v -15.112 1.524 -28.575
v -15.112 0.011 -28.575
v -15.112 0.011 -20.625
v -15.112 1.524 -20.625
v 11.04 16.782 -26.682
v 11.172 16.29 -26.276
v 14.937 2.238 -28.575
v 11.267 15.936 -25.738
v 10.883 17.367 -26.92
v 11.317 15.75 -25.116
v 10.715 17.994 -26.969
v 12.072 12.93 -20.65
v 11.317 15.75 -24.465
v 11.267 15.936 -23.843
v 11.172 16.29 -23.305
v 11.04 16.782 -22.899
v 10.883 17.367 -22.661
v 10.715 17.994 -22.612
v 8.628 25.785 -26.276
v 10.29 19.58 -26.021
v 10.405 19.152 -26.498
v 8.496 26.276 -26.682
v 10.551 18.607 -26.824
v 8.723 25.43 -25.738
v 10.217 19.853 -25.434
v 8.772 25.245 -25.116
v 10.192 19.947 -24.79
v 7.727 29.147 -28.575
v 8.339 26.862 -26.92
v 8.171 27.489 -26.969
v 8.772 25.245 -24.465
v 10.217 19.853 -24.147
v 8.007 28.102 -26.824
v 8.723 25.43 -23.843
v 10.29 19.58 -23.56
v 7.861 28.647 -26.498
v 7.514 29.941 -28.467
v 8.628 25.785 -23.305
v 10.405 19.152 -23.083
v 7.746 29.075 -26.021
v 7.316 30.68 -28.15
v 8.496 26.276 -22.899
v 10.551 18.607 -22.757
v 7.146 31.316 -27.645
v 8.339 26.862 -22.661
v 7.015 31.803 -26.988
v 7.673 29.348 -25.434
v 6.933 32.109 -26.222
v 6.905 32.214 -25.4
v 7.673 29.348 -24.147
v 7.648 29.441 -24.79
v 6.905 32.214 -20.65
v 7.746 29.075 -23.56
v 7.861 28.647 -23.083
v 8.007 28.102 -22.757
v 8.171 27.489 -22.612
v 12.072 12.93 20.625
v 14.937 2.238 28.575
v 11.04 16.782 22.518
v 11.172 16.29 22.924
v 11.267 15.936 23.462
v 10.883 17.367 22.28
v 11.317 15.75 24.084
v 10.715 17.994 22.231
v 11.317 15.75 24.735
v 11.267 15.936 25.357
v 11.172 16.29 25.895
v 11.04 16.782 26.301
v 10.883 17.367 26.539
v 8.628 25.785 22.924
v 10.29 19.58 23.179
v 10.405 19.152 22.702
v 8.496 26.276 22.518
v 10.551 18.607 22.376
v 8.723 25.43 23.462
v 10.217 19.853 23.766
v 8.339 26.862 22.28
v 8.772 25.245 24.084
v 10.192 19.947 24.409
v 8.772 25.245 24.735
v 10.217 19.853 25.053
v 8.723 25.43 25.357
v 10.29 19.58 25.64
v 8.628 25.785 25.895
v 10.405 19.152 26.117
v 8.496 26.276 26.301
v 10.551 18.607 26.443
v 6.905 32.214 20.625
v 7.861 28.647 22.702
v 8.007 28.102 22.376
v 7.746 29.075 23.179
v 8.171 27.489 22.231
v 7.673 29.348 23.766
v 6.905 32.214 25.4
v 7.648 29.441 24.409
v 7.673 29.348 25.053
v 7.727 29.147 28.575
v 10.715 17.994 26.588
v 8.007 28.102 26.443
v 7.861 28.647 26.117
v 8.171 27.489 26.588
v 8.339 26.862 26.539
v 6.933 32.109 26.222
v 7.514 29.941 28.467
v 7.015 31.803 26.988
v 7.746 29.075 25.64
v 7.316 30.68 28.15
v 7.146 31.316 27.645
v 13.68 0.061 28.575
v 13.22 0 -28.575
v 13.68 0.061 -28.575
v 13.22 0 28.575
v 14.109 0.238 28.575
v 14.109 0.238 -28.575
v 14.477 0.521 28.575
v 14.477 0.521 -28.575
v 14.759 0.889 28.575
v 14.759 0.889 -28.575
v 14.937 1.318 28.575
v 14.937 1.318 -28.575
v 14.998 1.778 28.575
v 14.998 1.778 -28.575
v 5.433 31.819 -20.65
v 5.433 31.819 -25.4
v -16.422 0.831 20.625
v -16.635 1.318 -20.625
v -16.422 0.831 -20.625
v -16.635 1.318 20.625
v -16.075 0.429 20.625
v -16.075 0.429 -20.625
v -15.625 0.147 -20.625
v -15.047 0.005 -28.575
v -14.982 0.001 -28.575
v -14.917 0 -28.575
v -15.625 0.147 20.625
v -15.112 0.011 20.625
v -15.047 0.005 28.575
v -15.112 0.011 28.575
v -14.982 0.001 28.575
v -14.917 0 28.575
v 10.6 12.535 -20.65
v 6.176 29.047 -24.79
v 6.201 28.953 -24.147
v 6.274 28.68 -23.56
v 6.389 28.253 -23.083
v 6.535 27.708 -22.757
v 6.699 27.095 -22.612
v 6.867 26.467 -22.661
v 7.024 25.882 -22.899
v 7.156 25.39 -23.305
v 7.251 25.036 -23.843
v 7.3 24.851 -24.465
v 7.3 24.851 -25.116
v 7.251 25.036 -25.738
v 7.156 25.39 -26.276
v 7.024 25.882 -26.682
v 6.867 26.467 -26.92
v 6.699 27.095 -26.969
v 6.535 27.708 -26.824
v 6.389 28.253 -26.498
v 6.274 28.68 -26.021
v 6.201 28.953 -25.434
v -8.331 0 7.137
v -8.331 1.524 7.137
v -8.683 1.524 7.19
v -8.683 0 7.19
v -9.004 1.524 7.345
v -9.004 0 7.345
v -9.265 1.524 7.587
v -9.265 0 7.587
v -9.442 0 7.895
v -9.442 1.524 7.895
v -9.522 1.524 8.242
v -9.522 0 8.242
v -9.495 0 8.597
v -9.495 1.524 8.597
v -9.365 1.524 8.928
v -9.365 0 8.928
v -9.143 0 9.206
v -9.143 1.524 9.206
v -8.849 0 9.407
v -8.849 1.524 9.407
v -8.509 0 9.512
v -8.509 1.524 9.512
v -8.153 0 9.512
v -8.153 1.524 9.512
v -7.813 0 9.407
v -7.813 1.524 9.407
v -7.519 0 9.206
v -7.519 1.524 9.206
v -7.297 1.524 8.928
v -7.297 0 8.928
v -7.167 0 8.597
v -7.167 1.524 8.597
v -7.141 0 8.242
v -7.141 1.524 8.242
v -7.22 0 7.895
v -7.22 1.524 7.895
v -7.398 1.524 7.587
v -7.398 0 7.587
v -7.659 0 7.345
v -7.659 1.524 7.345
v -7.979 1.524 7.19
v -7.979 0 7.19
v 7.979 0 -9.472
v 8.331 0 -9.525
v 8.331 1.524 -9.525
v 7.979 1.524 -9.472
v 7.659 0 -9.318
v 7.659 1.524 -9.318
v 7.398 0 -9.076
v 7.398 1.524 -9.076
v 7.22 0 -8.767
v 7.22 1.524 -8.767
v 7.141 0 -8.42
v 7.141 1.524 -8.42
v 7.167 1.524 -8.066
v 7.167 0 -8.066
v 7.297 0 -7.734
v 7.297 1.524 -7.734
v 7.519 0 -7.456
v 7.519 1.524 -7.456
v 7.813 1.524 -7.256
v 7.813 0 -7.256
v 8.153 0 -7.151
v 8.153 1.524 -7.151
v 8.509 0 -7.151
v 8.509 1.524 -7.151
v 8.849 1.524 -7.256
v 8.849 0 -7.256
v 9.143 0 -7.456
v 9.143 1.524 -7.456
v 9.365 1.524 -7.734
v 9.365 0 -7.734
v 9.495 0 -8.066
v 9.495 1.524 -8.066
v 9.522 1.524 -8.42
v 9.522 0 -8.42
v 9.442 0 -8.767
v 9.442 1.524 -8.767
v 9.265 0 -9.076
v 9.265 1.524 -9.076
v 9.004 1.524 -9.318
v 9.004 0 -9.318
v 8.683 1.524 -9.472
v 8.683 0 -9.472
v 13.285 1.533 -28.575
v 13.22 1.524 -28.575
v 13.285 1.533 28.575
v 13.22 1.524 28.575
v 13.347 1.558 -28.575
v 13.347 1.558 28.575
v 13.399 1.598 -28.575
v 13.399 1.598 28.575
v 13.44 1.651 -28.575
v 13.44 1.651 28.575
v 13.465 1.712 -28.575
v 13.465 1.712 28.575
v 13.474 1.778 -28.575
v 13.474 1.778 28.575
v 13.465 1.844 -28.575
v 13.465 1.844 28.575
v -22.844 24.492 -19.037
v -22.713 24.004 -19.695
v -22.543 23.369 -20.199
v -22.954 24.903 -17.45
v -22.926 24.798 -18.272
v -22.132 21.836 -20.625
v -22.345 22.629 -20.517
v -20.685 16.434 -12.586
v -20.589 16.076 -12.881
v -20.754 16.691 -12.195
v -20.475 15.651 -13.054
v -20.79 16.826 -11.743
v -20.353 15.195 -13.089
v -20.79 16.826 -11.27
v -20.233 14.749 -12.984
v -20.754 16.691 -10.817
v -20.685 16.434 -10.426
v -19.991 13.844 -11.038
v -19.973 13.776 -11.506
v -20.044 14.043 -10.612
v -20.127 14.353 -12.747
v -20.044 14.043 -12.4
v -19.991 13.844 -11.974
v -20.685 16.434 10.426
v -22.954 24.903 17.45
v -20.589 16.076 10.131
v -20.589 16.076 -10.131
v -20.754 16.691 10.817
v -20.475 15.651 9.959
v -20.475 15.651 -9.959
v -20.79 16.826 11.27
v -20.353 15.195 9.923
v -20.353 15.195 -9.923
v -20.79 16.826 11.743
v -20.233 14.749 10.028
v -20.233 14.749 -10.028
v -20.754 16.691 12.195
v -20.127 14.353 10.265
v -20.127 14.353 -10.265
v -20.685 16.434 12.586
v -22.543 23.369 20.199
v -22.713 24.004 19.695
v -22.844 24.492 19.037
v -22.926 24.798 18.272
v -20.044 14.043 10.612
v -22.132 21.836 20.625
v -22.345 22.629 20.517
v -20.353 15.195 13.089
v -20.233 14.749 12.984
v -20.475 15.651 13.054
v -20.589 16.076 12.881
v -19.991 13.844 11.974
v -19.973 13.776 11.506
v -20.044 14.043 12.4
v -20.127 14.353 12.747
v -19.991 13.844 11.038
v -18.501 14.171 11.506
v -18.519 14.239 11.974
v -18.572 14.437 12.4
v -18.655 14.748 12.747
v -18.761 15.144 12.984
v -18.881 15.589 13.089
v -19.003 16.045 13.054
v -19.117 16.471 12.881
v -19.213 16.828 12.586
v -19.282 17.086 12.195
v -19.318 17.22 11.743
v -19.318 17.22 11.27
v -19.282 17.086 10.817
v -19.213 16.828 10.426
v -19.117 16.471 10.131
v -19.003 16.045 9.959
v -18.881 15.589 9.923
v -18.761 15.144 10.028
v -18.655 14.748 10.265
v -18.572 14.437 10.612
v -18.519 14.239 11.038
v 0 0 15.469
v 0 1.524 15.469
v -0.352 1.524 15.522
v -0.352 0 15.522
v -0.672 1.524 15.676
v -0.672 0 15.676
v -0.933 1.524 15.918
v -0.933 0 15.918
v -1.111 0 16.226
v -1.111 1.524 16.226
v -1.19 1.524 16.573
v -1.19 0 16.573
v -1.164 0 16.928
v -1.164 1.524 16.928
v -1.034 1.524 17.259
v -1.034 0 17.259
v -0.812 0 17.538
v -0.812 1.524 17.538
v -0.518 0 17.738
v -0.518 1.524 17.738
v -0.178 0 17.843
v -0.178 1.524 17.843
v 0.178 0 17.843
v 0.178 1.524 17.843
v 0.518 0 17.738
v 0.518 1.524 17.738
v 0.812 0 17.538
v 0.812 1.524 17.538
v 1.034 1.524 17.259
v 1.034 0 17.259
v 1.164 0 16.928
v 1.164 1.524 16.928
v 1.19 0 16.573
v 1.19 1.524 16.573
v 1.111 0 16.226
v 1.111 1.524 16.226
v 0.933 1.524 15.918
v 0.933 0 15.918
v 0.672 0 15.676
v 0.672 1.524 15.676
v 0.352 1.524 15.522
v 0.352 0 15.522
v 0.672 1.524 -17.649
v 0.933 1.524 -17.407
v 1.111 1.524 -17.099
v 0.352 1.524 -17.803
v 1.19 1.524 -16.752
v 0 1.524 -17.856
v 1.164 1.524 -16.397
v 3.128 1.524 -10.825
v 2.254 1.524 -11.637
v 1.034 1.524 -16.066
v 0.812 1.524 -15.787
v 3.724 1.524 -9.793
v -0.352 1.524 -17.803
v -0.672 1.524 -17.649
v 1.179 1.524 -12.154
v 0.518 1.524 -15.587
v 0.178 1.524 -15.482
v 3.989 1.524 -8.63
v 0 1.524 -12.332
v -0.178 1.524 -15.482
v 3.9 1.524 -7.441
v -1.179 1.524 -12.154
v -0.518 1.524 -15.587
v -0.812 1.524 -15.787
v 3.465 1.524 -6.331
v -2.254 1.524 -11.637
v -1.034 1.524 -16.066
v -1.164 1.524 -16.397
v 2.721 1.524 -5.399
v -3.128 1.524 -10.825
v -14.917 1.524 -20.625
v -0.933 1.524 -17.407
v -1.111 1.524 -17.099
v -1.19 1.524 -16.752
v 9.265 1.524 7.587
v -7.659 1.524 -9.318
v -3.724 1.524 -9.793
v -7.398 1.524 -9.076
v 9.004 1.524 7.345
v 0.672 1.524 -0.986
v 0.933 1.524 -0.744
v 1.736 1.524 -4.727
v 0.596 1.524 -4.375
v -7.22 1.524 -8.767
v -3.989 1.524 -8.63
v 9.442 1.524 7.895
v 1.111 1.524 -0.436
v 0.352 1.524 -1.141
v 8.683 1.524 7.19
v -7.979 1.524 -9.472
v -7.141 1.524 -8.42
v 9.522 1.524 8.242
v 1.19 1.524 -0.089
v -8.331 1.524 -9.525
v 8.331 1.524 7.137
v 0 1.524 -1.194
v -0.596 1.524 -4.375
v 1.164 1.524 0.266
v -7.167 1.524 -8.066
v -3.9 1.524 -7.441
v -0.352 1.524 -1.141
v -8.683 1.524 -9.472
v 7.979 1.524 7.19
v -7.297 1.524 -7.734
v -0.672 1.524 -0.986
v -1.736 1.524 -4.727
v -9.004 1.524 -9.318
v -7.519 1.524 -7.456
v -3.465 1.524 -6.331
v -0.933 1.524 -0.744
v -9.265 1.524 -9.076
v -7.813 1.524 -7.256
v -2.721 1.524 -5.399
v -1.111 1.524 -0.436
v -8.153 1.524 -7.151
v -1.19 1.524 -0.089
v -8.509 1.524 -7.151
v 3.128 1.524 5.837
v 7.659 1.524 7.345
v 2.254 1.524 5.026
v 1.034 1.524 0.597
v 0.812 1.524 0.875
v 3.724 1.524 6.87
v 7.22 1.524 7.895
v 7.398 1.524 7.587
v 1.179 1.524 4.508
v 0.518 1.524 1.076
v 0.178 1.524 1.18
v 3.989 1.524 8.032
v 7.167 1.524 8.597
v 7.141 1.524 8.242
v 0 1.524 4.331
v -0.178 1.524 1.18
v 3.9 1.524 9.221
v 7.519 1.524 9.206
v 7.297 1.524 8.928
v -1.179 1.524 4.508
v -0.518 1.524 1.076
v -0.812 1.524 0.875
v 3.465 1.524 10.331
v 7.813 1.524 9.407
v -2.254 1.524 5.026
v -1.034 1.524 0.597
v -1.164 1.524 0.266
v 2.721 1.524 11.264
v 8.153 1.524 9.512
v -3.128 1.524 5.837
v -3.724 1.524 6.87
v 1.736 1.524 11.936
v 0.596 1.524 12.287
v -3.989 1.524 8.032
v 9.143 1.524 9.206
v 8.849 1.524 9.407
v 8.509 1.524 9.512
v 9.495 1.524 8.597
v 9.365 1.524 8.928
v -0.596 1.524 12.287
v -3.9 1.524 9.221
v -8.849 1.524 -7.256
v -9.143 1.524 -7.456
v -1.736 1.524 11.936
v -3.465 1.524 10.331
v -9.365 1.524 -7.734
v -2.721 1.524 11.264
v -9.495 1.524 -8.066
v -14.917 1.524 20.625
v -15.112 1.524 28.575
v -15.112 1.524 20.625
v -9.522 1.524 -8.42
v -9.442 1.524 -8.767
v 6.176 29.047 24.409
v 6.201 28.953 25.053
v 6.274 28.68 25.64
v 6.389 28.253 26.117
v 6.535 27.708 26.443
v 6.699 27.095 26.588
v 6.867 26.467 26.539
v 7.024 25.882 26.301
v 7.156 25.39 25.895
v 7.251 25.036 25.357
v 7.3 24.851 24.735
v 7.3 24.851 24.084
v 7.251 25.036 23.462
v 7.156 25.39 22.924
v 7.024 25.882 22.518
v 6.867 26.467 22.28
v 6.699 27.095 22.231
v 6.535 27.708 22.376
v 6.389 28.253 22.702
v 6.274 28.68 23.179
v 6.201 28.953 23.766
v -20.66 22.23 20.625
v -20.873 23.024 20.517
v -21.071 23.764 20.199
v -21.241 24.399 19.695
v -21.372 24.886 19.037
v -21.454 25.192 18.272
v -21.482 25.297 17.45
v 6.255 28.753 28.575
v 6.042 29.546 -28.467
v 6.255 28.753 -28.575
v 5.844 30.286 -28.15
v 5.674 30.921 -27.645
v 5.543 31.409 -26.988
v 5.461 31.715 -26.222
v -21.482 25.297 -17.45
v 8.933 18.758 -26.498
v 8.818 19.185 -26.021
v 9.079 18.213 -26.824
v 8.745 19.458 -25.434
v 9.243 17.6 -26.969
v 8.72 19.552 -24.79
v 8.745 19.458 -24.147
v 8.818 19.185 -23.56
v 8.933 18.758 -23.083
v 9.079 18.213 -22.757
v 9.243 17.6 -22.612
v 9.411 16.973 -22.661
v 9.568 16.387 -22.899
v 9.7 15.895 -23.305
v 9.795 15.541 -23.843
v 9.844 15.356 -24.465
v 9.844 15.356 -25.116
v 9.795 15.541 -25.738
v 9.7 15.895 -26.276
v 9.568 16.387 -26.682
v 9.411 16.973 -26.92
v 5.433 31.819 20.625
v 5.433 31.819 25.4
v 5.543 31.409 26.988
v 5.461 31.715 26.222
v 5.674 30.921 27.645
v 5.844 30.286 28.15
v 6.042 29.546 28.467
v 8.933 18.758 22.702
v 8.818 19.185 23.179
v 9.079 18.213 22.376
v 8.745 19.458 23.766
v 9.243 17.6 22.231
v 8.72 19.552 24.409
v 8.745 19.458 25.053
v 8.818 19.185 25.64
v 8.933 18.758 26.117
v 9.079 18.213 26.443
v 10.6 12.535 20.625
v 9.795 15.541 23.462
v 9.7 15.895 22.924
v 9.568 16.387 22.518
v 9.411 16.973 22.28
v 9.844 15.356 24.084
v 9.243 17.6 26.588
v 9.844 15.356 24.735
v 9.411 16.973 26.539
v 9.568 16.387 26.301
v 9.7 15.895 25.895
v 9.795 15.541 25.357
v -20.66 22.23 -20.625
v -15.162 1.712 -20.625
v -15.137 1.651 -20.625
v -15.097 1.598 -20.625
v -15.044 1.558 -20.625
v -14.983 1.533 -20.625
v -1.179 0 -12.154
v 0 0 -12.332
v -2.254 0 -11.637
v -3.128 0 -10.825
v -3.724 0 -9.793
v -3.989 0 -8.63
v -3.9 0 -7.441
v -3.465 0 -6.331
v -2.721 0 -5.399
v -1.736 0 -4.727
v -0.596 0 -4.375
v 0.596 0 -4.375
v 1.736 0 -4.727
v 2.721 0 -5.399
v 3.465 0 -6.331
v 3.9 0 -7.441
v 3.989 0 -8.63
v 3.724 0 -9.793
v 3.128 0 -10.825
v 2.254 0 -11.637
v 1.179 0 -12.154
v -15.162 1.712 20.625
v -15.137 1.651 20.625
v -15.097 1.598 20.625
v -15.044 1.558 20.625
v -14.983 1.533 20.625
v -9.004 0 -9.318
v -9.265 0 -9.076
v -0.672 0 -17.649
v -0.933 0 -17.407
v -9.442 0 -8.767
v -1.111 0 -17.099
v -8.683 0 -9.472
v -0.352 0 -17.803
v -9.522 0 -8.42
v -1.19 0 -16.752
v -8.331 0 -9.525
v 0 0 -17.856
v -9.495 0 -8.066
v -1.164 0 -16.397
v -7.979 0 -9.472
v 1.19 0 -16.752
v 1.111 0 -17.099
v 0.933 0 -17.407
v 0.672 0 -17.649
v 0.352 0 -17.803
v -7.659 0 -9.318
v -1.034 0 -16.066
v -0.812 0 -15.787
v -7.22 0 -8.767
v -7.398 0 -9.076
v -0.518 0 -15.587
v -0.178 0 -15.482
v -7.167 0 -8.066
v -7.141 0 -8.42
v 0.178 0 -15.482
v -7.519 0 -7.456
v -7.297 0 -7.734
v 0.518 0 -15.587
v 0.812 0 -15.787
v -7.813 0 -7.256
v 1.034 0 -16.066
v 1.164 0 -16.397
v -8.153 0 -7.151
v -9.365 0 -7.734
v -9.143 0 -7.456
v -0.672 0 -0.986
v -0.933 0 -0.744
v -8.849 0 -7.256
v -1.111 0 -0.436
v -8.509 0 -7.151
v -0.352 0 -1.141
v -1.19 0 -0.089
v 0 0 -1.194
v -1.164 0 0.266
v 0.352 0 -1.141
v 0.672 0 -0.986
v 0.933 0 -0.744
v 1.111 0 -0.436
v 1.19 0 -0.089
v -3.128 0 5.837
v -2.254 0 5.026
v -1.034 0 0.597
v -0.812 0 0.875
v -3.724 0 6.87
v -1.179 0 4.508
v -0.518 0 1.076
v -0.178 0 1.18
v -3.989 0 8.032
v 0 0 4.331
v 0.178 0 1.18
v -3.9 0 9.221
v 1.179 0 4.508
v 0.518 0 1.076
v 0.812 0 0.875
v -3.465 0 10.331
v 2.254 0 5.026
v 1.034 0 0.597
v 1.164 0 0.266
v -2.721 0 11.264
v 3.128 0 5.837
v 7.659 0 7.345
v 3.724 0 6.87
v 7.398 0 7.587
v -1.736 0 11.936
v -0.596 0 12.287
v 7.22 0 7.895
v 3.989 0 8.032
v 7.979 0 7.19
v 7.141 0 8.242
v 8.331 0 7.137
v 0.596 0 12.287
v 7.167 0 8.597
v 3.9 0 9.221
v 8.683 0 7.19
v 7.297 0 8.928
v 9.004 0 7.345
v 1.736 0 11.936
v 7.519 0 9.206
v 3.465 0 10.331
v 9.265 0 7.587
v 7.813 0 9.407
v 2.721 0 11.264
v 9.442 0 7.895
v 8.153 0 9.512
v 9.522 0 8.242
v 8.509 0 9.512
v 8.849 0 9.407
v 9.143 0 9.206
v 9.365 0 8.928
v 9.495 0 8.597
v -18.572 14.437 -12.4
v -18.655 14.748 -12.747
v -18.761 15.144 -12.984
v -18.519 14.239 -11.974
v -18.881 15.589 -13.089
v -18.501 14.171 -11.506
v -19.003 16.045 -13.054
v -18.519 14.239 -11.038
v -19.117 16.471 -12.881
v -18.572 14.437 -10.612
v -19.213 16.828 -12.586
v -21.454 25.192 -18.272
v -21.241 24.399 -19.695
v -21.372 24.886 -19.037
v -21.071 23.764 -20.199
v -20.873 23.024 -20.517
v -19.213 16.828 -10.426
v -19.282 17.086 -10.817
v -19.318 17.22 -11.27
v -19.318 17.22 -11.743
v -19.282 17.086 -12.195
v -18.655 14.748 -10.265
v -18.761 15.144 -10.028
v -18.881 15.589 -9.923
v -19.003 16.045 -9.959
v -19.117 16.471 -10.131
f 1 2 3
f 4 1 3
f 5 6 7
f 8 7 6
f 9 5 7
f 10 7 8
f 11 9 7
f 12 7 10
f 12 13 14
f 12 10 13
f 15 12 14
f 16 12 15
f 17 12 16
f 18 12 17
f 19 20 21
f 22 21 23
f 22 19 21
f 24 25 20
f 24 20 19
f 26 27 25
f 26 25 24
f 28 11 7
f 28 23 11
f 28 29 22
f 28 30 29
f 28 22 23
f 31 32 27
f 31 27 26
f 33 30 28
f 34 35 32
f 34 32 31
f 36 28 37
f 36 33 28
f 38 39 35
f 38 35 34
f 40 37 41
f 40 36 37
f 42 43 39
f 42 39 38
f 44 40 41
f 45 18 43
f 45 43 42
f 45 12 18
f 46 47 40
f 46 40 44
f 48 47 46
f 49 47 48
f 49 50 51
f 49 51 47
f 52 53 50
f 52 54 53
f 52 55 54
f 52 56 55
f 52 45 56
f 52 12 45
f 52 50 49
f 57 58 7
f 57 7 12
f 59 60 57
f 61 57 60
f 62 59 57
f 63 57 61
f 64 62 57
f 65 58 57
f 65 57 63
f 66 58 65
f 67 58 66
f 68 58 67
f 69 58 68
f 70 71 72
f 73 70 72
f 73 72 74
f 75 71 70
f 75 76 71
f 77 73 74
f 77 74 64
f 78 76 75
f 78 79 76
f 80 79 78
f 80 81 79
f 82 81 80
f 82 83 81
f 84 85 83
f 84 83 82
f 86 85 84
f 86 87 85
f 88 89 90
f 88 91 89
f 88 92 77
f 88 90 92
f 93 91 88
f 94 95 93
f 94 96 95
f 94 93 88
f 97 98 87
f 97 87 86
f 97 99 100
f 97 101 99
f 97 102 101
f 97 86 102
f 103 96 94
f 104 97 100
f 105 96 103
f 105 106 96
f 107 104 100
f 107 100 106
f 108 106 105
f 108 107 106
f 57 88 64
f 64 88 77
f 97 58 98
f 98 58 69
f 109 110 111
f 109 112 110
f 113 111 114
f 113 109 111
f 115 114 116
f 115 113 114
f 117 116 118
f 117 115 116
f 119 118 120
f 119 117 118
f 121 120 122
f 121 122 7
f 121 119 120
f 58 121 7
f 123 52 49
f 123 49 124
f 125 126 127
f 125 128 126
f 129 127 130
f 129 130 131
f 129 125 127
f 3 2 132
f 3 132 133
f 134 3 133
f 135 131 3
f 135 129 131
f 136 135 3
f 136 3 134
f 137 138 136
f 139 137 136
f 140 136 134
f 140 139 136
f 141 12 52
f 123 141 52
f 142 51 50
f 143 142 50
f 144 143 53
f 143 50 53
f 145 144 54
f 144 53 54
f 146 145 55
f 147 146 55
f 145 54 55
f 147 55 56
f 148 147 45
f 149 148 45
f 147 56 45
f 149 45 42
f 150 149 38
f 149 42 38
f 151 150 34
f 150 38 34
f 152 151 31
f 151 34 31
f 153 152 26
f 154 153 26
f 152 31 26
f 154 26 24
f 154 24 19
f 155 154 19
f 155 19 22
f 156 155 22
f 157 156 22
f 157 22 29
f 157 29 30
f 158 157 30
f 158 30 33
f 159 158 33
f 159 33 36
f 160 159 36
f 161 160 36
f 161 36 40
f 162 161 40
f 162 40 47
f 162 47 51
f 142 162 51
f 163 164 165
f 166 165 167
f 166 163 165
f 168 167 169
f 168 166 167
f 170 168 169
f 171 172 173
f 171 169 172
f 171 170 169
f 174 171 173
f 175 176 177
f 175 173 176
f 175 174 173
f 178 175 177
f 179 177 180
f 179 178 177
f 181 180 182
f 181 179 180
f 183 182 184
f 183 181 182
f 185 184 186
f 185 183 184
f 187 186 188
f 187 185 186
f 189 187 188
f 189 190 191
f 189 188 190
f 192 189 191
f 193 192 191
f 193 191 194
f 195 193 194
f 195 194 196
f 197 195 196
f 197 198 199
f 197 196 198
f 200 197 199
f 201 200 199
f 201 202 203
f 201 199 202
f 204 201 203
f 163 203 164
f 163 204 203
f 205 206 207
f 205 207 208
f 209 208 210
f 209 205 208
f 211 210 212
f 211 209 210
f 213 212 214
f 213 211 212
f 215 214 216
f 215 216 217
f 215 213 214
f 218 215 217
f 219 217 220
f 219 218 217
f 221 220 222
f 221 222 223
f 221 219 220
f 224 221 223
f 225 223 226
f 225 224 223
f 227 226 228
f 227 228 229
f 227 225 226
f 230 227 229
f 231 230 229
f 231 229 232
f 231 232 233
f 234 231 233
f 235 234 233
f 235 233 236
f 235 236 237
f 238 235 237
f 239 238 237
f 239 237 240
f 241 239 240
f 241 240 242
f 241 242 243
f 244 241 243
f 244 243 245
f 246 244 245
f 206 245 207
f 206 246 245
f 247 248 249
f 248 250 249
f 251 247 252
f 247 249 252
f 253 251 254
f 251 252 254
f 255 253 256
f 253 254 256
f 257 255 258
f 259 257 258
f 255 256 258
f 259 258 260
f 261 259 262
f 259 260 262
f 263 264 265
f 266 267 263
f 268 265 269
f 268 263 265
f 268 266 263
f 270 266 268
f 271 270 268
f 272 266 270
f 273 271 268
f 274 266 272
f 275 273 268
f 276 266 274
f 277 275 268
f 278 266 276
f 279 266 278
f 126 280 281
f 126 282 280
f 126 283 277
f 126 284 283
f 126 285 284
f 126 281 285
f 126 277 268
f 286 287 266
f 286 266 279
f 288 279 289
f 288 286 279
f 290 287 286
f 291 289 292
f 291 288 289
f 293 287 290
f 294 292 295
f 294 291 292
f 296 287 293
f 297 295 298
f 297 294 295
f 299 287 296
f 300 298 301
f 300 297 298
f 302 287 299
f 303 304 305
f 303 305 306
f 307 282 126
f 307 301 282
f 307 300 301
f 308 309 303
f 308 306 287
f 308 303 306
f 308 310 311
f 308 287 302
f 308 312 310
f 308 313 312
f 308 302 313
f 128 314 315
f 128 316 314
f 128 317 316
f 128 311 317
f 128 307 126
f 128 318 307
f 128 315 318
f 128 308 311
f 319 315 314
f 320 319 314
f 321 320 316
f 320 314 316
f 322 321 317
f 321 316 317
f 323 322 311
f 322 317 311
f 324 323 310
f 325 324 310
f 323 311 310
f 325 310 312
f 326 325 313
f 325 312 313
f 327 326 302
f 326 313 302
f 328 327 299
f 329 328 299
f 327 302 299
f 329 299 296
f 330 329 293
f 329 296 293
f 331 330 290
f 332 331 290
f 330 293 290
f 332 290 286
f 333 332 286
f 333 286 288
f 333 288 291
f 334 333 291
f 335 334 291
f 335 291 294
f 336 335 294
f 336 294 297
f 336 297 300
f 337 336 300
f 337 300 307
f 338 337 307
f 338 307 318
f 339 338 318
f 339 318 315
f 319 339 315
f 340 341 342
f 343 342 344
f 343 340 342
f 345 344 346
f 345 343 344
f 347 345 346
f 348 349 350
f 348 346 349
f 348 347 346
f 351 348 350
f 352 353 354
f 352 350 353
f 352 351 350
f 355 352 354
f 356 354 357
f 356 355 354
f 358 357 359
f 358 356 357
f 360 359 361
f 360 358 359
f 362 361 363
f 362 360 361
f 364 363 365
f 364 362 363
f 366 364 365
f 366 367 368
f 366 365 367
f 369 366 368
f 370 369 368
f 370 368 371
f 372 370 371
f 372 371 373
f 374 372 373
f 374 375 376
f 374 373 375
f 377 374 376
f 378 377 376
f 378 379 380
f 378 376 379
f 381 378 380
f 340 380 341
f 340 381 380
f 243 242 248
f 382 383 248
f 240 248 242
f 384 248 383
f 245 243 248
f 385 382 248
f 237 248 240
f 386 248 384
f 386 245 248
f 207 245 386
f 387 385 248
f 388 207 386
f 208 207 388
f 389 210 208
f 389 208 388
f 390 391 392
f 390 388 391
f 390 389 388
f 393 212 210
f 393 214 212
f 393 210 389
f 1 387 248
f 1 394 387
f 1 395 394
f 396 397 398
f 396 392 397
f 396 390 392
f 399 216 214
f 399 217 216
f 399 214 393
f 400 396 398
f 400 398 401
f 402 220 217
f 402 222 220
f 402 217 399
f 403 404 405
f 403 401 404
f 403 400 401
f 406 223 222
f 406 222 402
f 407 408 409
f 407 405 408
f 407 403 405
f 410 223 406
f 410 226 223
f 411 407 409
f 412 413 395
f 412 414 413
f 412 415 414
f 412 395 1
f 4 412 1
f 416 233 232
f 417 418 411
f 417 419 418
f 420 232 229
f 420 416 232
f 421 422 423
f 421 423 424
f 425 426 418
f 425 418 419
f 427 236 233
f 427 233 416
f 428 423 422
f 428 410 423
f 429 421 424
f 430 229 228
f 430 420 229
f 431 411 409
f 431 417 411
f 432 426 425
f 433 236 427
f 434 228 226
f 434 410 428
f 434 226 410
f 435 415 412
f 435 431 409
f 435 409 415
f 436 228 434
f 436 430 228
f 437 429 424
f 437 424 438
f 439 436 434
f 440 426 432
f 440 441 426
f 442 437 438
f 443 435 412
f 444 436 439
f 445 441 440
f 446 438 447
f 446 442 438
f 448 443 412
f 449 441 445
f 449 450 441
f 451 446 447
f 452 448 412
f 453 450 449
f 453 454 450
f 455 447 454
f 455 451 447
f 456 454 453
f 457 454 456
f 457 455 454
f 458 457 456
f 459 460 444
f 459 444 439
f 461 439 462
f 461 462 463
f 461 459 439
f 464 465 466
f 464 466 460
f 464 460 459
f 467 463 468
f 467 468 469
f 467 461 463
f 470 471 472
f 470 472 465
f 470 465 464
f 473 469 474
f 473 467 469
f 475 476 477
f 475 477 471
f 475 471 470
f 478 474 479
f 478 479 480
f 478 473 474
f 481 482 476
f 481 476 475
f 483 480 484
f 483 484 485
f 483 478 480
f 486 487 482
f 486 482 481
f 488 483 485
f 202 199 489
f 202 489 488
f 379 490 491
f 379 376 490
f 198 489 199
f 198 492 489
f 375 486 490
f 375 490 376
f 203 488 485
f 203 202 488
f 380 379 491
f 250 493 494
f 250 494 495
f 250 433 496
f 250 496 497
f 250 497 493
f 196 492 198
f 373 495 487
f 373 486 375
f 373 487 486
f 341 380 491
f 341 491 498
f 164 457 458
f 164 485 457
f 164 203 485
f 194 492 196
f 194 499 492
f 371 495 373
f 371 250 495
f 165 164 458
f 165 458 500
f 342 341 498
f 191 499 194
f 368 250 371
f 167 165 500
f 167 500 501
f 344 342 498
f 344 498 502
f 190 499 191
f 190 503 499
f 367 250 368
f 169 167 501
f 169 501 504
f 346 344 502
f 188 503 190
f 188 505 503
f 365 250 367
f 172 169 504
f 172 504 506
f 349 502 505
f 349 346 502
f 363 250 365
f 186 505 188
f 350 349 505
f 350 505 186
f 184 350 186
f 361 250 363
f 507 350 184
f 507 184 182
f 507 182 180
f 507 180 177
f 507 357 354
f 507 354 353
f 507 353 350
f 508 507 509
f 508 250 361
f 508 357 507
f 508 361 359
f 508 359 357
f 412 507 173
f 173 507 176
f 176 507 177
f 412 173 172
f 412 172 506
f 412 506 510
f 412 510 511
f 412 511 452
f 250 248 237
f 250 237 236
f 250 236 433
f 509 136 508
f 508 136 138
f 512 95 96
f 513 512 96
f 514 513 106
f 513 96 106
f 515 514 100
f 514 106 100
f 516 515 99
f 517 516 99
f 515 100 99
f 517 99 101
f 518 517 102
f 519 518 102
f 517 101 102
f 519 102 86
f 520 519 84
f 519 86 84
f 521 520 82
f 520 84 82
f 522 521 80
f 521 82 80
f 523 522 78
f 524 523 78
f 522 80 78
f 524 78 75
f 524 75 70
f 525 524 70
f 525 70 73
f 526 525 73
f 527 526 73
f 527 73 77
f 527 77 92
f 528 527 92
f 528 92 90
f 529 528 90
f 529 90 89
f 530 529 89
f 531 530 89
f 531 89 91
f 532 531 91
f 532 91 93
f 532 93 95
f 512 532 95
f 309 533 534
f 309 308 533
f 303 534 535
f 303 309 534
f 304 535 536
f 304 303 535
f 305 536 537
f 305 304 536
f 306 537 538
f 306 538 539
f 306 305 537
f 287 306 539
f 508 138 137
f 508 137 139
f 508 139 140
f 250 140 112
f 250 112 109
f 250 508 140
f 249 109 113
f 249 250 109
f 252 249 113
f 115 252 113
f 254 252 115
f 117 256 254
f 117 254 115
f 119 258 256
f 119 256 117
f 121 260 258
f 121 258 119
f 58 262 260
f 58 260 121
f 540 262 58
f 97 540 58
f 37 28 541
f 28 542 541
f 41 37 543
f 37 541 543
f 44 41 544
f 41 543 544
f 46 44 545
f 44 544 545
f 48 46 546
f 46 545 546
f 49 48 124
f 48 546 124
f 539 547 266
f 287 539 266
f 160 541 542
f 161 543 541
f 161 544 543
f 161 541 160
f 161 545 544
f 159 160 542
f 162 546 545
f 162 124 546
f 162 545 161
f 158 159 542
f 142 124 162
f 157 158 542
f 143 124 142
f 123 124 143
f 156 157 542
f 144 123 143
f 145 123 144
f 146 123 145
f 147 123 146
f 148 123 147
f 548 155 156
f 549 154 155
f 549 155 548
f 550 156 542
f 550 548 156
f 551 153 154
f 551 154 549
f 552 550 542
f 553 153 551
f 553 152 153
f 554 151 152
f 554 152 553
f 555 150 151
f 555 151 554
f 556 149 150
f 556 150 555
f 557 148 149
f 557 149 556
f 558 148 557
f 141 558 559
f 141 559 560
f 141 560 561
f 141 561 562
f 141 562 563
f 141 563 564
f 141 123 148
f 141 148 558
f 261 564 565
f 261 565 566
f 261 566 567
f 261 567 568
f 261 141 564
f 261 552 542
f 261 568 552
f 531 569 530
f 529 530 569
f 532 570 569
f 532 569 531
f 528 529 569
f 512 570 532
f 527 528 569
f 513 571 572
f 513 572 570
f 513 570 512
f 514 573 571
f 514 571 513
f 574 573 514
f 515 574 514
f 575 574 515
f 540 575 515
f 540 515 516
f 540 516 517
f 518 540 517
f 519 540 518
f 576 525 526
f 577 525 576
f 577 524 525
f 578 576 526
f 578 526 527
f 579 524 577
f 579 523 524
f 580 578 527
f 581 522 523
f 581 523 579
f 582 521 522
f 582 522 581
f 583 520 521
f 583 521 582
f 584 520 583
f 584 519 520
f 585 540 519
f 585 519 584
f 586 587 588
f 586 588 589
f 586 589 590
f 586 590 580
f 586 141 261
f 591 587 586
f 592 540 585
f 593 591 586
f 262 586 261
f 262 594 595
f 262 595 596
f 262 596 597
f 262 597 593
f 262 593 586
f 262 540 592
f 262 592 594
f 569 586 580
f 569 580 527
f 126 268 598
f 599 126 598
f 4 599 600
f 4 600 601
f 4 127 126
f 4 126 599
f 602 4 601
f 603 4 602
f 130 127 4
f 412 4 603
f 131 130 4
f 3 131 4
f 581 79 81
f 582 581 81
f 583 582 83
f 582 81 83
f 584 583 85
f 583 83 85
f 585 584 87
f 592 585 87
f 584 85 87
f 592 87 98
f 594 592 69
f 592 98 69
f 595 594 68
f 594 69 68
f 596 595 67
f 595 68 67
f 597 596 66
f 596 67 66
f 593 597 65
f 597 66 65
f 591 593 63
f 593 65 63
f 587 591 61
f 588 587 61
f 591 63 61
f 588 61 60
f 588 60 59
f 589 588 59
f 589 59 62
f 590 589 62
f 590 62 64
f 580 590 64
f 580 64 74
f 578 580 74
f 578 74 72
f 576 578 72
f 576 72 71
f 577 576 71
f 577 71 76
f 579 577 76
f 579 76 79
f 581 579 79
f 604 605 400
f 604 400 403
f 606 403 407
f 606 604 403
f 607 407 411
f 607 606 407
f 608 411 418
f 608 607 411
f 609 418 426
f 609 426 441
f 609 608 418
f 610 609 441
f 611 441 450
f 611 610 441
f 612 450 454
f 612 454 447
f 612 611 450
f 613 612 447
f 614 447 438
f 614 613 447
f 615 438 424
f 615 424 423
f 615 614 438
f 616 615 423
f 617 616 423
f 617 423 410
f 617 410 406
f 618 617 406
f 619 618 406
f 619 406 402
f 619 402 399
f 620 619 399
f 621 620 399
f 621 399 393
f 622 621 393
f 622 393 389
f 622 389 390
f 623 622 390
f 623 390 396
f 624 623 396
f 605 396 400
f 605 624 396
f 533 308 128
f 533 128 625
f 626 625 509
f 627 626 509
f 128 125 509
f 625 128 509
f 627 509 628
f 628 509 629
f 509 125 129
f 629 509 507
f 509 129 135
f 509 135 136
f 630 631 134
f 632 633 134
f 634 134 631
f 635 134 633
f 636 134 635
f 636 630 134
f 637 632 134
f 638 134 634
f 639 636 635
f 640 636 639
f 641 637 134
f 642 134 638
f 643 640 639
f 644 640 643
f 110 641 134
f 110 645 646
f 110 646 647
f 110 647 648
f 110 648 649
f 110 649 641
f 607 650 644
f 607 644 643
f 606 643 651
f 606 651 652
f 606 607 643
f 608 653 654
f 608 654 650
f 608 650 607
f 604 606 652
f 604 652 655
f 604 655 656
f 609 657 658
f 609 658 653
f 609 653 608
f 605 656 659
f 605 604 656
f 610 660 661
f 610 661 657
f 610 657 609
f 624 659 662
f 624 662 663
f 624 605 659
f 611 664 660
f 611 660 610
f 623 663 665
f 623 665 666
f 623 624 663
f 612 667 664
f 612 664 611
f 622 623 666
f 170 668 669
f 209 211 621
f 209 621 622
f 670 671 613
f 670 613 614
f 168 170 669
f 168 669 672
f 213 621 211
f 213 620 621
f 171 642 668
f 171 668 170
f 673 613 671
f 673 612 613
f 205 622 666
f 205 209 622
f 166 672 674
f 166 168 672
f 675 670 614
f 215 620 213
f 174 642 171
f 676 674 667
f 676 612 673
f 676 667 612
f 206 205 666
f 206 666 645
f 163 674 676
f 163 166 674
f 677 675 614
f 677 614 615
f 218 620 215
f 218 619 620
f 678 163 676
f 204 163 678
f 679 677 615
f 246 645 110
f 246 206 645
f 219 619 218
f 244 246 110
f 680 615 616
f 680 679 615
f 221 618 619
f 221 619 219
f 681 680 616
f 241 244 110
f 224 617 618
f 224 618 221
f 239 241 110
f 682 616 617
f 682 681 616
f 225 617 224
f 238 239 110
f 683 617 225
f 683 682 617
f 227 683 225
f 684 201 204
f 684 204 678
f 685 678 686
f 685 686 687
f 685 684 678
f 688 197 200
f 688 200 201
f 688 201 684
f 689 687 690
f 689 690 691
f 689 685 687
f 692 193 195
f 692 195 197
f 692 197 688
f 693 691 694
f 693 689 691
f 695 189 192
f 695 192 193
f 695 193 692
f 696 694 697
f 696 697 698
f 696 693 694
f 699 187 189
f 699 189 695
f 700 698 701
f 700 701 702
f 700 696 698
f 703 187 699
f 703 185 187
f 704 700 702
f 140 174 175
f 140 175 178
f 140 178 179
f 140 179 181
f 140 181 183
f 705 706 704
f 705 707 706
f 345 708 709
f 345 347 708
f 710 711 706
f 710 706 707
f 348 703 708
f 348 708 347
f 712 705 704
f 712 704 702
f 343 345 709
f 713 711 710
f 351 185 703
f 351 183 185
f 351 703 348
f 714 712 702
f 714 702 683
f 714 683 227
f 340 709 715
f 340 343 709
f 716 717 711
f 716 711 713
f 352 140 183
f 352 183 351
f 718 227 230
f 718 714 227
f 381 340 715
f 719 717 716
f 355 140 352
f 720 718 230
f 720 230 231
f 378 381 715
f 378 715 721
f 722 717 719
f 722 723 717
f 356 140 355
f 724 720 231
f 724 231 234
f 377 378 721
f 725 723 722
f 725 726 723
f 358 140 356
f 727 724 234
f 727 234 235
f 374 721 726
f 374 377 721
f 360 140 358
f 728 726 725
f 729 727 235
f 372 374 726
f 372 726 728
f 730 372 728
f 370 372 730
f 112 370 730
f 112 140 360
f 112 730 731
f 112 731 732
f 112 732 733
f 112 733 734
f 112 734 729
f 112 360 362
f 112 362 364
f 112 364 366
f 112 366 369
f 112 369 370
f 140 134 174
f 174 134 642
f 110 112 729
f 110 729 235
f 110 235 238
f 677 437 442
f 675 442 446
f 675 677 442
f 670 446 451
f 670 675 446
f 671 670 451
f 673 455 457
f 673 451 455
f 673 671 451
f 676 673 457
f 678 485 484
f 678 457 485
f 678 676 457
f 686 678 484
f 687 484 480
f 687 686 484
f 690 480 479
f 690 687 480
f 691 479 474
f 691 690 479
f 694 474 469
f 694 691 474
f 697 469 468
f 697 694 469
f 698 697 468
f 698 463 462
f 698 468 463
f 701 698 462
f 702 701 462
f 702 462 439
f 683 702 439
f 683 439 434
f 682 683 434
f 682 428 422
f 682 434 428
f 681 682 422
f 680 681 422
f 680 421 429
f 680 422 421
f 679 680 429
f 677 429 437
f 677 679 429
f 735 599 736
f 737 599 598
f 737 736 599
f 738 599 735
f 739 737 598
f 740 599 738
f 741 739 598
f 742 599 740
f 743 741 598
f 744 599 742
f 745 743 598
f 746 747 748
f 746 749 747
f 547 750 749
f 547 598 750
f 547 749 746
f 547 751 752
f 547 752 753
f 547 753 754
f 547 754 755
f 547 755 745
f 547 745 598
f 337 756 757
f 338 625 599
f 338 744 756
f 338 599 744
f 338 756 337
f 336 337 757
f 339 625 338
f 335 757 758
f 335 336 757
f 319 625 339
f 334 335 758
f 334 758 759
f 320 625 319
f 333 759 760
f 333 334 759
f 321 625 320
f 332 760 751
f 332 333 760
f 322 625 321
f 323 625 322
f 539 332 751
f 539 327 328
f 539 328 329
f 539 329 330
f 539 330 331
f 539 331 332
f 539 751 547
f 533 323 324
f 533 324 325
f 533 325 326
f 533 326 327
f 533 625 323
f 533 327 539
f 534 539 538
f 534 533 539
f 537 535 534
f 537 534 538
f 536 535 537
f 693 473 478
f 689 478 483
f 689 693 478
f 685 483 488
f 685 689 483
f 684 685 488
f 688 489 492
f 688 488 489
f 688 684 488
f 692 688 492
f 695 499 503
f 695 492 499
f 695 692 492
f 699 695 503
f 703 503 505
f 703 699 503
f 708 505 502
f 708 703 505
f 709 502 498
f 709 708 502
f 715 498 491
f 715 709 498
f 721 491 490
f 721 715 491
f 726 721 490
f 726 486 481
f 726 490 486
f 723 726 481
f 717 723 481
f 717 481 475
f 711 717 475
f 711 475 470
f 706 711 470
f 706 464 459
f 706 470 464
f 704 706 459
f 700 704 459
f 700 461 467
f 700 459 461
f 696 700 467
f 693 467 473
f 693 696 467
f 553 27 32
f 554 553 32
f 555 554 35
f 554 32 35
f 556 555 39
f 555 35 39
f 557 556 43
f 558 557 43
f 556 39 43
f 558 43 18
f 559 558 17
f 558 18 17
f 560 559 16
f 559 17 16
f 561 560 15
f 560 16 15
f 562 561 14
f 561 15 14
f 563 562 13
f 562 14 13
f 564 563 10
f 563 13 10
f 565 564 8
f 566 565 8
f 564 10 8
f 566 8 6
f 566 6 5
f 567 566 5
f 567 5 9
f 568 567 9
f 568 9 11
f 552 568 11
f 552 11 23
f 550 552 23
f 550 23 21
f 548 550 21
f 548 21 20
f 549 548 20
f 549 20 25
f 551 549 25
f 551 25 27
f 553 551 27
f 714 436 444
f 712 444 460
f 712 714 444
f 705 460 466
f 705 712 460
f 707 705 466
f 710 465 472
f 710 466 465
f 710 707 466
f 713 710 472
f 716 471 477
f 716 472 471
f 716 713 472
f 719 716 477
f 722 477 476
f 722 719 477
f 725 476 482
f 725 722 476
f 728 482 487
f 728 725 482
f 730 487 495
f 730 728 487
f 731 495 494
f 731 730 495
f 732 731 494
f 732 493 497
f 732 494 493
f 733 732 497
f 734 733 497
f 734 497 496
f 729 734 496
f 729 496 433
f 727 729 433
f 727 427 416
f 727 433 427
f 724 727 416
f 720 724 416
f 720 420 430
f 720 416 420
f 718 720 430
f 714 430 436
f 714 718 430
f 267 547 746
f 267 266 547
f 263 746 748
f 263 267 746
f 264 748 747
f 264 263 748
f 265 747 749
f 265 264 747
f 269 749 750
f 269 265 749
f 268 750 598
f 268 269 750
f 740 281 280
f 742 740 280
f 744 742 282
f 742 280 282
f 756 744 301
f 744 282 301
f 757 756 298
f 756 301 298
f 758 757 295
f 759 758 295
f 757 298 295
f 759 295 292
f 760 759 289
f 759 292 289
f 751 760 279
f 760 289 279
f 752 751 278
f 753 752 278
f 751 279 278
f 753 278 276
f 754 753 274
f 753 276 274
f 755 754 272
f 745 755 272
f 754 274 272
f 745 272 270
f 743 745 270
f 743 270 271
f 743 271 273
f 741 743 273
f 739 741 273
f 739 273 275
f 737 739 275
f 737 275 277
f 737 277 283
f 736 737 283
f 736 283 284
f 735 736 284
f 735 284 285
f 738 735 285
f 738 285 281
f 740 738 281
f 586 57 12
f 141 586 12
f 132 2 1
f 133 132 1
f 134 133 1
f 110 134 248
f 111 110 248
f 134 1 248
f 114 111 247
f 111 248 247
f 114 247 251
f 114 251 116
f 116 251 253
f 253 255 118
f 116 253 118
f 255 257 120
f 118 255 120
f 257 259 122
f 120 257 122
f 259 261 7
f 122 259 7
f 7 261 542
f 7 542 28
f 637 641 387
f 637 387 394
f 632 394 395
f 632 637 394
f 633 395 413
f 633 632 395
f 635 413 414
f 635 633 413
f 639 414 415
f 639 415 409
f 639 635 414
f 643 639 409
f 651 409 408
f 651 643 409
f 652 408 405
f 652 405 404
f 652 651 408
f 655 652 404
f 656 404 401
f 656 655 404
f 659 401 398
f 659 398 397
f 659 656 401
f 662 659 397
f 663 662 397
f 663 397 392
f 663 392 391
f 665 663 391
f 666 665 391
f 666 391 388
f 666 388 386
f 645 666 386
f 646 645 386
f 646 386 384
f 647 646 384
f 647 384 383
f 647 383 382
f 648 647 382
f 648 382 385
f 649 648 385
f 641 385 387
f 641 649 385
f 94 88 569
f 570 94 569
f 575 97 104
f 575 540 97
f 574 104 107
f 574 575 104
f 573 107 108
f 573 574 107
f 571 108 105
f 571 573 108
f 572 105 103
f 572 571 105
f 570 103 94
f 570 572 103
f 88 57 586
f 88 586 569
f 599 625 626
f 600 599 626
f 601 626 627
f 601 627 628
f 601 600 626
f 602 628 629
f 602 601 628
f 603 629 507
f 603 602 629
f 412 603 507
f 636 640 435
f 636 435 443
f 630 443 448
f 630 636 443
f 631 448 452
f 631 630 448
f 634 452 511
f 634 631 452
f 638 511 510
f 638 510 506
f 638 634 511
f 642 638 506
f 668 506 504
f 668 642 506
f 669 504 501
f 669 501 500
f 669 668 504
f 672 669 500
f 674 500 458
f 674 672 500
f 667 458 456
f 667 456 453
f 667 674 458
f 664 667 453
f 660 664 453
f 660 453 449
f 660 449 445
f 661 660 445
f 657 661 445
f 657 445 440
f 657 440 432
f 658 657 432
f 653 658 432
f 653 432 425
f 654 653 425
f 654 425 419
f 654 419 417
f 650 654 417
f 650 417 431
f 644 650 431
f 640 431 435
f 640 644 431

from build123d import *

# Parameters (mm, degrees)
EXTRUDE1_DEPTH      = 28.575
CUT_EXTRUDE1_REACH  = 34.214
SKETCH2_R           = 4.0005
SKETCH2_R_2         = 1.1938
SKETCH21_R          = 4.0005
SKETCH21_R_2        = 1.1938
CUT_EXTRUDE11_DEPTH = 1.524
CUT_EXTRUDE13_REACH = 39.179
SKETCH23_W          = 41.275
SKETCH23_H          = 19.9644
CUT_EXTRUDE14_REACH = 39.179
SKETCH24_R          = 2.1844
CUT_EXTRUDE16_REACH = 41.072
SKETCH26_R          = 1.5875
SKETCH27_W          = 12.7
SKETCH27_H          = 7.9502
CUT_EXTRUDE17_DEPTH = 33.213819492
FILLET1_R           = 0.254
FILLET2_R           = 1.778
FILLET3_R           = 3.175


with BuildPart() as part:
    # Sketch1 → Extrude1 (new body, symmetric)
    with BuildSketch(Plane.XY):
        Polygon((-22.954013802, 24.902533728), (-16.2814, 0), (15.536778129, 0), (6.905111211, 32.213819492), (5.433040251, 31.819379267), (13.550662661, 1.524), (-15.11199367, 1.524), (-21.481942843, 25.296973952), align=None)
    extrude(amount=EXTRUDE1_DEPTH, both=True)

    # Sketch2 → Cut-Extrude1 (cut, up to next)
    with BuildSketch(Plane(origin=(0.432553042, 0, 10.730384283), x_dir=(-1, 0, 0), z_dir=(0, 1, 0)), mode=Mode.PRIVATE) as cut_extrude1_sk1:
        with Locations(Location((0.432553042, -2.399184283, 0), (0, 0, 270))):  # turned: the seam where the file's is
            Circle(SKETCH2_R)
    cut_extrude1_tool1 = extrude(cut_extrude1_sk1.sketch, amount=CUT_EXTRUDE1_REACH, mode=Mode.PRIVATE) & part.part
    add(cut_extrude1_tool1.solids().sort_by_distance((0, 0, 8.3312))[0], mode=Mode.SUBTRACT)
    # Sketch2 → Cut-Extrude1 (cut, up to next)
    with BuildSketch(Plane(origin=(0.432553042, 0, 10.730384283), x_dir=(-1, 0, 0), z_dir=(0, 1, 0)), mode=Mode.PRIVATE) as cut_extrude1_sk2:
        with Locations(Location((0.432553042, 5.932015717, 0), (0, 0, 270))):  # turned: the seam where the file's is
            Circle(SKETCH2_R_2)
    cut_extrude1_tool2 = extrude(cut_extrude1_sk2.sketch, amount=CUT_EXTRUDE1_REACH, mode=Mode.PRIVATE) & part.part
    add(cut_extrude1_tool2.solids().sort_by_distance((0, 0, 16.6624))[0], mode=Mode.SUBTRACT)
    # Sketch2 → Cut-Extrude1 (cut, up to next)
    with BuildSketch(Plane(origin=(0.432553042, 0, 10.730384283), x_dir=(-1, 0, 0), z_dir=(0, 1, 0)), mode=Mode.PRIVATE) as cut_extrude1_sk3:
        with Locations(Location((8.763753042, -2.399184283, 0), (0, 0, 270))):  # turned: the seam where the file's is
            Circle(SKETCH2_R_2)
    cut_extrude1_tool3 = extrude(cut_extrude1_sk3.sketch, amount=CUT_EXTRUDE1_REACH, mode=Mode.PRIVATE) & part.part
    add(cut_extrude1_tool3.solids().sort_by_distance((-8.3312, 0, 8.3312))[0], mode=Mode.SUBTRACT)
    # Sketch2 → Cut-Extrude1 (cut, up to next)
    with BuildSketch(Plane(origin=(0.432553042, 0, 10.730384283), x_dir=(-1, 0, 0), z_dir=(0, 1, 0)), mode=Mode.PRIVATE) as cut_extrude1_sk4:
        with Locations(Location((0.432553042, -10.730384283, 0), (0, 0, 270))):  # turned: the seam where the file's is
            Circle(SKETCH2_R_2)
    cut_extrude1_tool4 = extrude(cut_extrude1_sk4.sketch, amount=CUT_EXTRUDE1_REACH, mode=Mode.PRIVATE) & part.part
    add(cut_extrude1_tool4.solids().sort_by_distance((0, 0, 0))[0], mode=Mode.SUBTRACT)
    # Sketch2 → Cut-Extrude1 (cut, up to next)
    with BuildSketch(Plane(origin=(0.432553042, 0, 10.730384283), x_dir=(-1, 0, 0), z_dir=(0, 1, 0)), mode=Mode.PRIVATE) as cut_extrude1_sk5:
        with Locations(Location((-7.898646958, -2.399184283, 0), (0, 0, 270))):  # turned: the seam where the file's is
            Circle(SKETCH2_R_2)
    cut_extrude1_tool5 = extrude(cut_extrude1_sk5.sketch, amount=CUT_EXTRUDE1_REACH, mode=Mode.PRIVATE) & part.part
    add(cut_extrude1_tool5.solids().sort_by_distance((8.3312, 0, 8.3312))[0], mode=Mode.SUBTRACT)

    # Sketch21 → Cut-Extrude11 (cut)
    with BuildSketch(Plane(origin=(1.025651892, 0, -16.036287214), x_dir=(-1, 0, 0), z_dir=(0, 1, 0))):
        with Locations(Location((1.025651892, 7.705087214, 0), (0, 0, 270))):  # turned: the seam where the file's is
            Circle(SKETCH21_R)
        with Locations(Location((1.025651892, 16.036287214, 0), (0, 0, 270))):  # turned: the seam where the file's is
            Circle(SKETCH21_R_2)
        with Locations(Location((9.356851892, 7.705087214, 0), (0, 0, 270))):  # turned: the seam where the file's is
            Circle(SKETCH21_R_2)
        with Locations(Location((1.025651892, -0.626112786, 0), (0, 0, 270))):  # turned: the seam where the file's is
            Circle(SKETCH21_R_2)
        with Locations(Location((-7.305548108, 7.705087214, 0), (0, 0, 270))):  # turned: the seam where the file's is
            Circle(SKETCH21_R_2)
    extrude(amount=CUT_EXTRUDE11_DEPTH, mode=Mode.SUBTRACT)

    # Sketch23 → Cut-Extrude13 (cut, up to next)
    with BuildSketch(Plane(origin=(14.496011341, 3.884194532, 0), x_dir=(0, 0, -1), z_dir=(0.965925826, 0.258819045, 0)), mode=Mode.PRIVATE) as cut_extrude13_sk1:
        with Locations((0.0127, 19.346785921)):
            Rectangle(SKETCH23_W, SKETCH23_H)
    cut_extrude13_tool1 = extrude(cut_extrude13_sk1.sketch, amount=-CUT_EXTRUDE13_REACH, mode=Mode.PRIVATE) & part.part
    add(cut_extrude13_tool1.solids().sort_by_distance((9.488695, 22.571755, -0.0127))[0], mode=Mode.SUBTRACT)

    # Sketch24 → Cut-Extrude14 (cut, up to next)
    with BuildSketch(Plane(origin=(14.496011341, 3.884194532, 0), x_dir=(0, 0, -1), z_dir=(0.965925826, 0.258819045, 0)), mode=Mode.PRIVATE) as cut_extrude14_sk1:
        with Locations(Location((-24.4094, 24.274385921, 0), (0, 0, 90))):  # turned: the seam where the file's is
            Circle(SKETCH24_R)
    cut_extrude14_tool1 = extrude(cut_extrude14_sk1.sketch, amount=-CUT_EXTRUDE14_REACH, mode=Mode.PRIVATE) & part.part
    add(cut_extrude14_tool1.solids().sort_by_distance((8.213338, 27.331451, 24.4094))[0], mode=Mode.SUBTRACT)
    # Sketch24 → Cut-Extrude14 (cut, up to next)
    with BuildSketch(Plane(origin=(14.496011341, 3.884194532, 0), x_dir=(0, 0, -1), z_dir=(0.965925826, 0.258819045, 0)), mode=Mode.PRIVATE) as cut_extrude14_sk2:
        with Locations(Location((-24.4094, 14.444585921, 0), (0, 0, 90))):  # turned: the seam where the file's is
            Circle(SKETCH24_R)
    cut_extrude14_tool2 = extrude(cut_extrude14_sk2.sketch, amount=-CUT_EXTRUDE14_REACH, mode=Mode.PRIVATE) & part.part
    add(cut_extrude14_tool2.solids().sort_by_distance((10.757477, 17.836593, 24.4094))[0], mode=Mode.SUBTRACT)
    # Sketch24 → Cut-Extrude14 (cut, up to next)
    with BuildSketch(Plane(origin=(14.496011341, 3.884194532, 0), x_dir=(0, 0, -1), z_dir=(0.965925826, 0.258819045, 0)), mode=Mode.PRIVATE) as cut_extrude14_sk3:
        with Locations(Location((24.7904, 24.274385921, 0), (0, 0, 90))):  # turned: the seam where the file's is
            Circle(SKETCH24_R)
    cut_extrude14_tool3 = extrude(cut_extrude14_sk3.sketch, amount=-CUT_EXTRUDE14_REACH, mode=Mode.PRIVATE) & part.part
    add(cut_extrude14_tool3.solids().sort_by_distance((8.213338, 27.331451, -24.7904))[0], mode=Mode.SUBTRACT)
    # Sketch24 → Cut-Extrude14 (cut, up to next)
    with BuildSketch(Plane(origin=(14.496011341, 3.884194532, 0), x_dir=(0, 0, -1), z_dir=(0.965925826, 0.258819045, 0)), mode=Mode.PRIVATE) as cut_extrude14_sk4:
        with Locations(Location((24.7904, 14.444585921, 0), (0, 0, 90))):  # turned: the seam where the file's is
            Circle(SKETCH24_R)
    cut_extrude14_tool4 = extrude(cut_extrude14_sk4.sketch, amount=-CUT_EXTRUDE14_REACH, mode=Mode.PRIVATE) & part.part
    add(cut_extrude14_tool4.solids().sort_by_distance((10.757477, 17.836593, -24.7904))[0], mode=Mode.SUBTRACT)

    # Sketch26 → Cut-Extrude16 (cut, up to next)
    with BuildSketch(Plane(origin=(-15.190753005, -4.07035, 0), x_dir=(0, 0, 1), z_dir=(-0.965925826, -0.258819045, 0)), mode=Mode.PRIVATE) as cut_extrude16_sk1:
        with Locations(Location((-11.5062, 20.063536401, 0), (0, 0, 270))):  # turned: the seam where the file's is
            Circle(SKETCH26_R)
    cut_extrude16_tool1 = extrude(cut_extrude16_sk1.sketch, amount=-CUT_EXTRUDE16_REACH, mode=Mode.PRIVATE) & part.part
    add(cut_extrude16_tool1.solids().sort_by_distance((-20.383578, 15.309538, -11.5062))[0], mode=Mode.SUBTRACT)
    # Sketch26 → Cut-Extrude16 (cut, up to next)
    with BuildSketch(Plane(origin=(-15.190753005, -4.07035, 0), x_dir=(0, 0, 1), z_dir=(-0.965925826, -0.258819045, 0)), mode=Mode.PRIVATE) as cut_extrude16_sk2:
        with Locations(Location((11.5062, 20.063536401, 0), (0, 0, 270))):  # turned: the seam where the file's is
            Circle(SKETCH26_R)
    cut_extrude16_tool2 = extrude(cut_extrude16_sk2.sketch, amount=-CUT_EXTRUDE16_REACH, mode=Mode.PRIVATE) & part.part
    add(cut_extrude16_tool2.solids().sort_by_distance((-20.383578, 15.309538, 11.5062))[0], mode=Mode.SUBTRACT)

    # Sketch27 → Cut-Extrude17 (cut, through all)
    with BuildSketch(Plane.XZ):
        with Locations((-21.46199367, 24.5999)):
            Rectangle(SKETCH27_W, SKETCH27_H)
        with Locations((-21.46199367, -24.5999)):
            Rectangle(SKETCH27_W, SKETCH27_H)
    extrude(amount=-CUT_EXTRUDE17_DEPTH, mode=Mode.SUBTRACT)

    # Fillet1
    fillet1_edges = [part.edges().sort_by_distance(p)[0] for p in [
        (-15.11199367, 1.524, 0),
        (13.550662661, 1.524, 0),
    ]]
    fillet(fillet1_edges, radius=FILLET1_R)

    # Fillet2
    fillet2_edges = [part.edges().sort_by_distance(p)[0] for p in [
        (15.536778129, 0, 0),
        (-16.2814, 0, 0),
    ]]
    fillet(fillet2_edges, radius=FILLET2_R)

    # Fillet3
    fillet3_edges = [part.edges().sort_by_distance(p)[0] for p in [
        (-22.217978322, 25.09975384, 20.6248),
        (-22.217978322, 25.09975384, -20.6248),
        (6.169075731, 32.01659938, 28.575),
        (6.169075731, 32.01659938, -28.575),
    ]]
    fillet(fillet3_edges, radius=FILLET3_R)


solid = part.part
